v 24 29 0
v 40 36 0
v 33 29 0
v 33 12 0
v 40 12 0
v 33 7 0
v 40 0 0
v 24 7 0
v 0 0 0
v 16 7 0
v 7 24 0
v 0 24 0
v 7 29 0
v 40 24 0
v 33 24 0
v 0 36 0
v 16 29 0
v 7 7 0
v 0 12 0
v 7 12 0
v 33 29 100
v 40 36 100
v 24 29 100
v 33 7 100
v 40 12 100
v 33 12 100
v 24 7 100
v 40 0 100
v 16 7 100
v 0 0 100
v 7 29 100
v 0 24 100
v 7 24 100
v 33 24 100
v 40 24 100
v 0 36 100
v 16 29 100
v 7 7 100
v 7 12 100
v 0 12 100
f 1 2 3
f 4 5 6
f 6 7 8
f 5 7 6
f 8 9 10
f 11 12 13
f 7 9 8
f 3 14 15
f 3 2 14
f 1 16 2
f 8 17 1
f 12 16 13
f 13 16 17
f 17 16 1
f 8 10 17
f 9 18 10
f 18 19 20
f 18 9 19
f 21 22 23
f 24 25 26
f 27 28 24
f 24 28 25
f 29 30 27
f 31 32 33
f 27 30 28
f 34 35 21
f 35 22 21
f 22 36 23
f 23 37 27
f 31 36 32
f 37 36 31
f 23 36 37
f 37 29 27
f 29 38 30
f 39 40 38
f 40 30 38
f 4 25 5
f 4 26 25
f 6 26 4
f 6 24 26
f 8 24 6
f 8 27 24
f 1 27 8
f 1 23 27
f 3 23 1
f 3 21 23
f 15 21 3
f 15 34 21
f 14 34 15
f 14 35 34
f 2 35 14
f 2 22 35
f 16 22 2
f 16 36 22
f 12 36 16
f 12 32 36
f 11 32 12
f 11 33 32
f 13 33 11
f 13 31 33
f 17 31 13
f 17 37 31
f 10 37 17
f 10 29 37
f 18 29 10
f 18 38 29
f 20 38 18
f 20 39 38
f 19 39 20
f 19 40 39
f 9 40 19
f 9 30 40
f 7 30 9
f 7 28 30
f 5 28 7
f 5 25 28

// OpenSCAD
$fn = 32;

// ----------------------------------------------------------------------
// T-slot rail: 40 x 36 mm section, 100 mm long
// ----------------------------------------------------------------------

// --- parameters (mm) ---
profile_height = 100;     // extrusion height
profile_points = 20;      // points of the closed outline

profile = [[0, 0], [40, 0], [40, 12], [33, 12], [33, 7], [24, 7], [24, 29], [33, 29], [33, 24], [40, 24], [40, 36], [0, 36], [0, 24], [7, 24], [7, 29], [16, 29], [16, 7], [7, 7], [7, 12], [0, 12]];  // single closed polygon, 20 points, counter clockwise

// --- the one profile operation ---
linear_extrude(height = profile_height) polygon(points = profile);
